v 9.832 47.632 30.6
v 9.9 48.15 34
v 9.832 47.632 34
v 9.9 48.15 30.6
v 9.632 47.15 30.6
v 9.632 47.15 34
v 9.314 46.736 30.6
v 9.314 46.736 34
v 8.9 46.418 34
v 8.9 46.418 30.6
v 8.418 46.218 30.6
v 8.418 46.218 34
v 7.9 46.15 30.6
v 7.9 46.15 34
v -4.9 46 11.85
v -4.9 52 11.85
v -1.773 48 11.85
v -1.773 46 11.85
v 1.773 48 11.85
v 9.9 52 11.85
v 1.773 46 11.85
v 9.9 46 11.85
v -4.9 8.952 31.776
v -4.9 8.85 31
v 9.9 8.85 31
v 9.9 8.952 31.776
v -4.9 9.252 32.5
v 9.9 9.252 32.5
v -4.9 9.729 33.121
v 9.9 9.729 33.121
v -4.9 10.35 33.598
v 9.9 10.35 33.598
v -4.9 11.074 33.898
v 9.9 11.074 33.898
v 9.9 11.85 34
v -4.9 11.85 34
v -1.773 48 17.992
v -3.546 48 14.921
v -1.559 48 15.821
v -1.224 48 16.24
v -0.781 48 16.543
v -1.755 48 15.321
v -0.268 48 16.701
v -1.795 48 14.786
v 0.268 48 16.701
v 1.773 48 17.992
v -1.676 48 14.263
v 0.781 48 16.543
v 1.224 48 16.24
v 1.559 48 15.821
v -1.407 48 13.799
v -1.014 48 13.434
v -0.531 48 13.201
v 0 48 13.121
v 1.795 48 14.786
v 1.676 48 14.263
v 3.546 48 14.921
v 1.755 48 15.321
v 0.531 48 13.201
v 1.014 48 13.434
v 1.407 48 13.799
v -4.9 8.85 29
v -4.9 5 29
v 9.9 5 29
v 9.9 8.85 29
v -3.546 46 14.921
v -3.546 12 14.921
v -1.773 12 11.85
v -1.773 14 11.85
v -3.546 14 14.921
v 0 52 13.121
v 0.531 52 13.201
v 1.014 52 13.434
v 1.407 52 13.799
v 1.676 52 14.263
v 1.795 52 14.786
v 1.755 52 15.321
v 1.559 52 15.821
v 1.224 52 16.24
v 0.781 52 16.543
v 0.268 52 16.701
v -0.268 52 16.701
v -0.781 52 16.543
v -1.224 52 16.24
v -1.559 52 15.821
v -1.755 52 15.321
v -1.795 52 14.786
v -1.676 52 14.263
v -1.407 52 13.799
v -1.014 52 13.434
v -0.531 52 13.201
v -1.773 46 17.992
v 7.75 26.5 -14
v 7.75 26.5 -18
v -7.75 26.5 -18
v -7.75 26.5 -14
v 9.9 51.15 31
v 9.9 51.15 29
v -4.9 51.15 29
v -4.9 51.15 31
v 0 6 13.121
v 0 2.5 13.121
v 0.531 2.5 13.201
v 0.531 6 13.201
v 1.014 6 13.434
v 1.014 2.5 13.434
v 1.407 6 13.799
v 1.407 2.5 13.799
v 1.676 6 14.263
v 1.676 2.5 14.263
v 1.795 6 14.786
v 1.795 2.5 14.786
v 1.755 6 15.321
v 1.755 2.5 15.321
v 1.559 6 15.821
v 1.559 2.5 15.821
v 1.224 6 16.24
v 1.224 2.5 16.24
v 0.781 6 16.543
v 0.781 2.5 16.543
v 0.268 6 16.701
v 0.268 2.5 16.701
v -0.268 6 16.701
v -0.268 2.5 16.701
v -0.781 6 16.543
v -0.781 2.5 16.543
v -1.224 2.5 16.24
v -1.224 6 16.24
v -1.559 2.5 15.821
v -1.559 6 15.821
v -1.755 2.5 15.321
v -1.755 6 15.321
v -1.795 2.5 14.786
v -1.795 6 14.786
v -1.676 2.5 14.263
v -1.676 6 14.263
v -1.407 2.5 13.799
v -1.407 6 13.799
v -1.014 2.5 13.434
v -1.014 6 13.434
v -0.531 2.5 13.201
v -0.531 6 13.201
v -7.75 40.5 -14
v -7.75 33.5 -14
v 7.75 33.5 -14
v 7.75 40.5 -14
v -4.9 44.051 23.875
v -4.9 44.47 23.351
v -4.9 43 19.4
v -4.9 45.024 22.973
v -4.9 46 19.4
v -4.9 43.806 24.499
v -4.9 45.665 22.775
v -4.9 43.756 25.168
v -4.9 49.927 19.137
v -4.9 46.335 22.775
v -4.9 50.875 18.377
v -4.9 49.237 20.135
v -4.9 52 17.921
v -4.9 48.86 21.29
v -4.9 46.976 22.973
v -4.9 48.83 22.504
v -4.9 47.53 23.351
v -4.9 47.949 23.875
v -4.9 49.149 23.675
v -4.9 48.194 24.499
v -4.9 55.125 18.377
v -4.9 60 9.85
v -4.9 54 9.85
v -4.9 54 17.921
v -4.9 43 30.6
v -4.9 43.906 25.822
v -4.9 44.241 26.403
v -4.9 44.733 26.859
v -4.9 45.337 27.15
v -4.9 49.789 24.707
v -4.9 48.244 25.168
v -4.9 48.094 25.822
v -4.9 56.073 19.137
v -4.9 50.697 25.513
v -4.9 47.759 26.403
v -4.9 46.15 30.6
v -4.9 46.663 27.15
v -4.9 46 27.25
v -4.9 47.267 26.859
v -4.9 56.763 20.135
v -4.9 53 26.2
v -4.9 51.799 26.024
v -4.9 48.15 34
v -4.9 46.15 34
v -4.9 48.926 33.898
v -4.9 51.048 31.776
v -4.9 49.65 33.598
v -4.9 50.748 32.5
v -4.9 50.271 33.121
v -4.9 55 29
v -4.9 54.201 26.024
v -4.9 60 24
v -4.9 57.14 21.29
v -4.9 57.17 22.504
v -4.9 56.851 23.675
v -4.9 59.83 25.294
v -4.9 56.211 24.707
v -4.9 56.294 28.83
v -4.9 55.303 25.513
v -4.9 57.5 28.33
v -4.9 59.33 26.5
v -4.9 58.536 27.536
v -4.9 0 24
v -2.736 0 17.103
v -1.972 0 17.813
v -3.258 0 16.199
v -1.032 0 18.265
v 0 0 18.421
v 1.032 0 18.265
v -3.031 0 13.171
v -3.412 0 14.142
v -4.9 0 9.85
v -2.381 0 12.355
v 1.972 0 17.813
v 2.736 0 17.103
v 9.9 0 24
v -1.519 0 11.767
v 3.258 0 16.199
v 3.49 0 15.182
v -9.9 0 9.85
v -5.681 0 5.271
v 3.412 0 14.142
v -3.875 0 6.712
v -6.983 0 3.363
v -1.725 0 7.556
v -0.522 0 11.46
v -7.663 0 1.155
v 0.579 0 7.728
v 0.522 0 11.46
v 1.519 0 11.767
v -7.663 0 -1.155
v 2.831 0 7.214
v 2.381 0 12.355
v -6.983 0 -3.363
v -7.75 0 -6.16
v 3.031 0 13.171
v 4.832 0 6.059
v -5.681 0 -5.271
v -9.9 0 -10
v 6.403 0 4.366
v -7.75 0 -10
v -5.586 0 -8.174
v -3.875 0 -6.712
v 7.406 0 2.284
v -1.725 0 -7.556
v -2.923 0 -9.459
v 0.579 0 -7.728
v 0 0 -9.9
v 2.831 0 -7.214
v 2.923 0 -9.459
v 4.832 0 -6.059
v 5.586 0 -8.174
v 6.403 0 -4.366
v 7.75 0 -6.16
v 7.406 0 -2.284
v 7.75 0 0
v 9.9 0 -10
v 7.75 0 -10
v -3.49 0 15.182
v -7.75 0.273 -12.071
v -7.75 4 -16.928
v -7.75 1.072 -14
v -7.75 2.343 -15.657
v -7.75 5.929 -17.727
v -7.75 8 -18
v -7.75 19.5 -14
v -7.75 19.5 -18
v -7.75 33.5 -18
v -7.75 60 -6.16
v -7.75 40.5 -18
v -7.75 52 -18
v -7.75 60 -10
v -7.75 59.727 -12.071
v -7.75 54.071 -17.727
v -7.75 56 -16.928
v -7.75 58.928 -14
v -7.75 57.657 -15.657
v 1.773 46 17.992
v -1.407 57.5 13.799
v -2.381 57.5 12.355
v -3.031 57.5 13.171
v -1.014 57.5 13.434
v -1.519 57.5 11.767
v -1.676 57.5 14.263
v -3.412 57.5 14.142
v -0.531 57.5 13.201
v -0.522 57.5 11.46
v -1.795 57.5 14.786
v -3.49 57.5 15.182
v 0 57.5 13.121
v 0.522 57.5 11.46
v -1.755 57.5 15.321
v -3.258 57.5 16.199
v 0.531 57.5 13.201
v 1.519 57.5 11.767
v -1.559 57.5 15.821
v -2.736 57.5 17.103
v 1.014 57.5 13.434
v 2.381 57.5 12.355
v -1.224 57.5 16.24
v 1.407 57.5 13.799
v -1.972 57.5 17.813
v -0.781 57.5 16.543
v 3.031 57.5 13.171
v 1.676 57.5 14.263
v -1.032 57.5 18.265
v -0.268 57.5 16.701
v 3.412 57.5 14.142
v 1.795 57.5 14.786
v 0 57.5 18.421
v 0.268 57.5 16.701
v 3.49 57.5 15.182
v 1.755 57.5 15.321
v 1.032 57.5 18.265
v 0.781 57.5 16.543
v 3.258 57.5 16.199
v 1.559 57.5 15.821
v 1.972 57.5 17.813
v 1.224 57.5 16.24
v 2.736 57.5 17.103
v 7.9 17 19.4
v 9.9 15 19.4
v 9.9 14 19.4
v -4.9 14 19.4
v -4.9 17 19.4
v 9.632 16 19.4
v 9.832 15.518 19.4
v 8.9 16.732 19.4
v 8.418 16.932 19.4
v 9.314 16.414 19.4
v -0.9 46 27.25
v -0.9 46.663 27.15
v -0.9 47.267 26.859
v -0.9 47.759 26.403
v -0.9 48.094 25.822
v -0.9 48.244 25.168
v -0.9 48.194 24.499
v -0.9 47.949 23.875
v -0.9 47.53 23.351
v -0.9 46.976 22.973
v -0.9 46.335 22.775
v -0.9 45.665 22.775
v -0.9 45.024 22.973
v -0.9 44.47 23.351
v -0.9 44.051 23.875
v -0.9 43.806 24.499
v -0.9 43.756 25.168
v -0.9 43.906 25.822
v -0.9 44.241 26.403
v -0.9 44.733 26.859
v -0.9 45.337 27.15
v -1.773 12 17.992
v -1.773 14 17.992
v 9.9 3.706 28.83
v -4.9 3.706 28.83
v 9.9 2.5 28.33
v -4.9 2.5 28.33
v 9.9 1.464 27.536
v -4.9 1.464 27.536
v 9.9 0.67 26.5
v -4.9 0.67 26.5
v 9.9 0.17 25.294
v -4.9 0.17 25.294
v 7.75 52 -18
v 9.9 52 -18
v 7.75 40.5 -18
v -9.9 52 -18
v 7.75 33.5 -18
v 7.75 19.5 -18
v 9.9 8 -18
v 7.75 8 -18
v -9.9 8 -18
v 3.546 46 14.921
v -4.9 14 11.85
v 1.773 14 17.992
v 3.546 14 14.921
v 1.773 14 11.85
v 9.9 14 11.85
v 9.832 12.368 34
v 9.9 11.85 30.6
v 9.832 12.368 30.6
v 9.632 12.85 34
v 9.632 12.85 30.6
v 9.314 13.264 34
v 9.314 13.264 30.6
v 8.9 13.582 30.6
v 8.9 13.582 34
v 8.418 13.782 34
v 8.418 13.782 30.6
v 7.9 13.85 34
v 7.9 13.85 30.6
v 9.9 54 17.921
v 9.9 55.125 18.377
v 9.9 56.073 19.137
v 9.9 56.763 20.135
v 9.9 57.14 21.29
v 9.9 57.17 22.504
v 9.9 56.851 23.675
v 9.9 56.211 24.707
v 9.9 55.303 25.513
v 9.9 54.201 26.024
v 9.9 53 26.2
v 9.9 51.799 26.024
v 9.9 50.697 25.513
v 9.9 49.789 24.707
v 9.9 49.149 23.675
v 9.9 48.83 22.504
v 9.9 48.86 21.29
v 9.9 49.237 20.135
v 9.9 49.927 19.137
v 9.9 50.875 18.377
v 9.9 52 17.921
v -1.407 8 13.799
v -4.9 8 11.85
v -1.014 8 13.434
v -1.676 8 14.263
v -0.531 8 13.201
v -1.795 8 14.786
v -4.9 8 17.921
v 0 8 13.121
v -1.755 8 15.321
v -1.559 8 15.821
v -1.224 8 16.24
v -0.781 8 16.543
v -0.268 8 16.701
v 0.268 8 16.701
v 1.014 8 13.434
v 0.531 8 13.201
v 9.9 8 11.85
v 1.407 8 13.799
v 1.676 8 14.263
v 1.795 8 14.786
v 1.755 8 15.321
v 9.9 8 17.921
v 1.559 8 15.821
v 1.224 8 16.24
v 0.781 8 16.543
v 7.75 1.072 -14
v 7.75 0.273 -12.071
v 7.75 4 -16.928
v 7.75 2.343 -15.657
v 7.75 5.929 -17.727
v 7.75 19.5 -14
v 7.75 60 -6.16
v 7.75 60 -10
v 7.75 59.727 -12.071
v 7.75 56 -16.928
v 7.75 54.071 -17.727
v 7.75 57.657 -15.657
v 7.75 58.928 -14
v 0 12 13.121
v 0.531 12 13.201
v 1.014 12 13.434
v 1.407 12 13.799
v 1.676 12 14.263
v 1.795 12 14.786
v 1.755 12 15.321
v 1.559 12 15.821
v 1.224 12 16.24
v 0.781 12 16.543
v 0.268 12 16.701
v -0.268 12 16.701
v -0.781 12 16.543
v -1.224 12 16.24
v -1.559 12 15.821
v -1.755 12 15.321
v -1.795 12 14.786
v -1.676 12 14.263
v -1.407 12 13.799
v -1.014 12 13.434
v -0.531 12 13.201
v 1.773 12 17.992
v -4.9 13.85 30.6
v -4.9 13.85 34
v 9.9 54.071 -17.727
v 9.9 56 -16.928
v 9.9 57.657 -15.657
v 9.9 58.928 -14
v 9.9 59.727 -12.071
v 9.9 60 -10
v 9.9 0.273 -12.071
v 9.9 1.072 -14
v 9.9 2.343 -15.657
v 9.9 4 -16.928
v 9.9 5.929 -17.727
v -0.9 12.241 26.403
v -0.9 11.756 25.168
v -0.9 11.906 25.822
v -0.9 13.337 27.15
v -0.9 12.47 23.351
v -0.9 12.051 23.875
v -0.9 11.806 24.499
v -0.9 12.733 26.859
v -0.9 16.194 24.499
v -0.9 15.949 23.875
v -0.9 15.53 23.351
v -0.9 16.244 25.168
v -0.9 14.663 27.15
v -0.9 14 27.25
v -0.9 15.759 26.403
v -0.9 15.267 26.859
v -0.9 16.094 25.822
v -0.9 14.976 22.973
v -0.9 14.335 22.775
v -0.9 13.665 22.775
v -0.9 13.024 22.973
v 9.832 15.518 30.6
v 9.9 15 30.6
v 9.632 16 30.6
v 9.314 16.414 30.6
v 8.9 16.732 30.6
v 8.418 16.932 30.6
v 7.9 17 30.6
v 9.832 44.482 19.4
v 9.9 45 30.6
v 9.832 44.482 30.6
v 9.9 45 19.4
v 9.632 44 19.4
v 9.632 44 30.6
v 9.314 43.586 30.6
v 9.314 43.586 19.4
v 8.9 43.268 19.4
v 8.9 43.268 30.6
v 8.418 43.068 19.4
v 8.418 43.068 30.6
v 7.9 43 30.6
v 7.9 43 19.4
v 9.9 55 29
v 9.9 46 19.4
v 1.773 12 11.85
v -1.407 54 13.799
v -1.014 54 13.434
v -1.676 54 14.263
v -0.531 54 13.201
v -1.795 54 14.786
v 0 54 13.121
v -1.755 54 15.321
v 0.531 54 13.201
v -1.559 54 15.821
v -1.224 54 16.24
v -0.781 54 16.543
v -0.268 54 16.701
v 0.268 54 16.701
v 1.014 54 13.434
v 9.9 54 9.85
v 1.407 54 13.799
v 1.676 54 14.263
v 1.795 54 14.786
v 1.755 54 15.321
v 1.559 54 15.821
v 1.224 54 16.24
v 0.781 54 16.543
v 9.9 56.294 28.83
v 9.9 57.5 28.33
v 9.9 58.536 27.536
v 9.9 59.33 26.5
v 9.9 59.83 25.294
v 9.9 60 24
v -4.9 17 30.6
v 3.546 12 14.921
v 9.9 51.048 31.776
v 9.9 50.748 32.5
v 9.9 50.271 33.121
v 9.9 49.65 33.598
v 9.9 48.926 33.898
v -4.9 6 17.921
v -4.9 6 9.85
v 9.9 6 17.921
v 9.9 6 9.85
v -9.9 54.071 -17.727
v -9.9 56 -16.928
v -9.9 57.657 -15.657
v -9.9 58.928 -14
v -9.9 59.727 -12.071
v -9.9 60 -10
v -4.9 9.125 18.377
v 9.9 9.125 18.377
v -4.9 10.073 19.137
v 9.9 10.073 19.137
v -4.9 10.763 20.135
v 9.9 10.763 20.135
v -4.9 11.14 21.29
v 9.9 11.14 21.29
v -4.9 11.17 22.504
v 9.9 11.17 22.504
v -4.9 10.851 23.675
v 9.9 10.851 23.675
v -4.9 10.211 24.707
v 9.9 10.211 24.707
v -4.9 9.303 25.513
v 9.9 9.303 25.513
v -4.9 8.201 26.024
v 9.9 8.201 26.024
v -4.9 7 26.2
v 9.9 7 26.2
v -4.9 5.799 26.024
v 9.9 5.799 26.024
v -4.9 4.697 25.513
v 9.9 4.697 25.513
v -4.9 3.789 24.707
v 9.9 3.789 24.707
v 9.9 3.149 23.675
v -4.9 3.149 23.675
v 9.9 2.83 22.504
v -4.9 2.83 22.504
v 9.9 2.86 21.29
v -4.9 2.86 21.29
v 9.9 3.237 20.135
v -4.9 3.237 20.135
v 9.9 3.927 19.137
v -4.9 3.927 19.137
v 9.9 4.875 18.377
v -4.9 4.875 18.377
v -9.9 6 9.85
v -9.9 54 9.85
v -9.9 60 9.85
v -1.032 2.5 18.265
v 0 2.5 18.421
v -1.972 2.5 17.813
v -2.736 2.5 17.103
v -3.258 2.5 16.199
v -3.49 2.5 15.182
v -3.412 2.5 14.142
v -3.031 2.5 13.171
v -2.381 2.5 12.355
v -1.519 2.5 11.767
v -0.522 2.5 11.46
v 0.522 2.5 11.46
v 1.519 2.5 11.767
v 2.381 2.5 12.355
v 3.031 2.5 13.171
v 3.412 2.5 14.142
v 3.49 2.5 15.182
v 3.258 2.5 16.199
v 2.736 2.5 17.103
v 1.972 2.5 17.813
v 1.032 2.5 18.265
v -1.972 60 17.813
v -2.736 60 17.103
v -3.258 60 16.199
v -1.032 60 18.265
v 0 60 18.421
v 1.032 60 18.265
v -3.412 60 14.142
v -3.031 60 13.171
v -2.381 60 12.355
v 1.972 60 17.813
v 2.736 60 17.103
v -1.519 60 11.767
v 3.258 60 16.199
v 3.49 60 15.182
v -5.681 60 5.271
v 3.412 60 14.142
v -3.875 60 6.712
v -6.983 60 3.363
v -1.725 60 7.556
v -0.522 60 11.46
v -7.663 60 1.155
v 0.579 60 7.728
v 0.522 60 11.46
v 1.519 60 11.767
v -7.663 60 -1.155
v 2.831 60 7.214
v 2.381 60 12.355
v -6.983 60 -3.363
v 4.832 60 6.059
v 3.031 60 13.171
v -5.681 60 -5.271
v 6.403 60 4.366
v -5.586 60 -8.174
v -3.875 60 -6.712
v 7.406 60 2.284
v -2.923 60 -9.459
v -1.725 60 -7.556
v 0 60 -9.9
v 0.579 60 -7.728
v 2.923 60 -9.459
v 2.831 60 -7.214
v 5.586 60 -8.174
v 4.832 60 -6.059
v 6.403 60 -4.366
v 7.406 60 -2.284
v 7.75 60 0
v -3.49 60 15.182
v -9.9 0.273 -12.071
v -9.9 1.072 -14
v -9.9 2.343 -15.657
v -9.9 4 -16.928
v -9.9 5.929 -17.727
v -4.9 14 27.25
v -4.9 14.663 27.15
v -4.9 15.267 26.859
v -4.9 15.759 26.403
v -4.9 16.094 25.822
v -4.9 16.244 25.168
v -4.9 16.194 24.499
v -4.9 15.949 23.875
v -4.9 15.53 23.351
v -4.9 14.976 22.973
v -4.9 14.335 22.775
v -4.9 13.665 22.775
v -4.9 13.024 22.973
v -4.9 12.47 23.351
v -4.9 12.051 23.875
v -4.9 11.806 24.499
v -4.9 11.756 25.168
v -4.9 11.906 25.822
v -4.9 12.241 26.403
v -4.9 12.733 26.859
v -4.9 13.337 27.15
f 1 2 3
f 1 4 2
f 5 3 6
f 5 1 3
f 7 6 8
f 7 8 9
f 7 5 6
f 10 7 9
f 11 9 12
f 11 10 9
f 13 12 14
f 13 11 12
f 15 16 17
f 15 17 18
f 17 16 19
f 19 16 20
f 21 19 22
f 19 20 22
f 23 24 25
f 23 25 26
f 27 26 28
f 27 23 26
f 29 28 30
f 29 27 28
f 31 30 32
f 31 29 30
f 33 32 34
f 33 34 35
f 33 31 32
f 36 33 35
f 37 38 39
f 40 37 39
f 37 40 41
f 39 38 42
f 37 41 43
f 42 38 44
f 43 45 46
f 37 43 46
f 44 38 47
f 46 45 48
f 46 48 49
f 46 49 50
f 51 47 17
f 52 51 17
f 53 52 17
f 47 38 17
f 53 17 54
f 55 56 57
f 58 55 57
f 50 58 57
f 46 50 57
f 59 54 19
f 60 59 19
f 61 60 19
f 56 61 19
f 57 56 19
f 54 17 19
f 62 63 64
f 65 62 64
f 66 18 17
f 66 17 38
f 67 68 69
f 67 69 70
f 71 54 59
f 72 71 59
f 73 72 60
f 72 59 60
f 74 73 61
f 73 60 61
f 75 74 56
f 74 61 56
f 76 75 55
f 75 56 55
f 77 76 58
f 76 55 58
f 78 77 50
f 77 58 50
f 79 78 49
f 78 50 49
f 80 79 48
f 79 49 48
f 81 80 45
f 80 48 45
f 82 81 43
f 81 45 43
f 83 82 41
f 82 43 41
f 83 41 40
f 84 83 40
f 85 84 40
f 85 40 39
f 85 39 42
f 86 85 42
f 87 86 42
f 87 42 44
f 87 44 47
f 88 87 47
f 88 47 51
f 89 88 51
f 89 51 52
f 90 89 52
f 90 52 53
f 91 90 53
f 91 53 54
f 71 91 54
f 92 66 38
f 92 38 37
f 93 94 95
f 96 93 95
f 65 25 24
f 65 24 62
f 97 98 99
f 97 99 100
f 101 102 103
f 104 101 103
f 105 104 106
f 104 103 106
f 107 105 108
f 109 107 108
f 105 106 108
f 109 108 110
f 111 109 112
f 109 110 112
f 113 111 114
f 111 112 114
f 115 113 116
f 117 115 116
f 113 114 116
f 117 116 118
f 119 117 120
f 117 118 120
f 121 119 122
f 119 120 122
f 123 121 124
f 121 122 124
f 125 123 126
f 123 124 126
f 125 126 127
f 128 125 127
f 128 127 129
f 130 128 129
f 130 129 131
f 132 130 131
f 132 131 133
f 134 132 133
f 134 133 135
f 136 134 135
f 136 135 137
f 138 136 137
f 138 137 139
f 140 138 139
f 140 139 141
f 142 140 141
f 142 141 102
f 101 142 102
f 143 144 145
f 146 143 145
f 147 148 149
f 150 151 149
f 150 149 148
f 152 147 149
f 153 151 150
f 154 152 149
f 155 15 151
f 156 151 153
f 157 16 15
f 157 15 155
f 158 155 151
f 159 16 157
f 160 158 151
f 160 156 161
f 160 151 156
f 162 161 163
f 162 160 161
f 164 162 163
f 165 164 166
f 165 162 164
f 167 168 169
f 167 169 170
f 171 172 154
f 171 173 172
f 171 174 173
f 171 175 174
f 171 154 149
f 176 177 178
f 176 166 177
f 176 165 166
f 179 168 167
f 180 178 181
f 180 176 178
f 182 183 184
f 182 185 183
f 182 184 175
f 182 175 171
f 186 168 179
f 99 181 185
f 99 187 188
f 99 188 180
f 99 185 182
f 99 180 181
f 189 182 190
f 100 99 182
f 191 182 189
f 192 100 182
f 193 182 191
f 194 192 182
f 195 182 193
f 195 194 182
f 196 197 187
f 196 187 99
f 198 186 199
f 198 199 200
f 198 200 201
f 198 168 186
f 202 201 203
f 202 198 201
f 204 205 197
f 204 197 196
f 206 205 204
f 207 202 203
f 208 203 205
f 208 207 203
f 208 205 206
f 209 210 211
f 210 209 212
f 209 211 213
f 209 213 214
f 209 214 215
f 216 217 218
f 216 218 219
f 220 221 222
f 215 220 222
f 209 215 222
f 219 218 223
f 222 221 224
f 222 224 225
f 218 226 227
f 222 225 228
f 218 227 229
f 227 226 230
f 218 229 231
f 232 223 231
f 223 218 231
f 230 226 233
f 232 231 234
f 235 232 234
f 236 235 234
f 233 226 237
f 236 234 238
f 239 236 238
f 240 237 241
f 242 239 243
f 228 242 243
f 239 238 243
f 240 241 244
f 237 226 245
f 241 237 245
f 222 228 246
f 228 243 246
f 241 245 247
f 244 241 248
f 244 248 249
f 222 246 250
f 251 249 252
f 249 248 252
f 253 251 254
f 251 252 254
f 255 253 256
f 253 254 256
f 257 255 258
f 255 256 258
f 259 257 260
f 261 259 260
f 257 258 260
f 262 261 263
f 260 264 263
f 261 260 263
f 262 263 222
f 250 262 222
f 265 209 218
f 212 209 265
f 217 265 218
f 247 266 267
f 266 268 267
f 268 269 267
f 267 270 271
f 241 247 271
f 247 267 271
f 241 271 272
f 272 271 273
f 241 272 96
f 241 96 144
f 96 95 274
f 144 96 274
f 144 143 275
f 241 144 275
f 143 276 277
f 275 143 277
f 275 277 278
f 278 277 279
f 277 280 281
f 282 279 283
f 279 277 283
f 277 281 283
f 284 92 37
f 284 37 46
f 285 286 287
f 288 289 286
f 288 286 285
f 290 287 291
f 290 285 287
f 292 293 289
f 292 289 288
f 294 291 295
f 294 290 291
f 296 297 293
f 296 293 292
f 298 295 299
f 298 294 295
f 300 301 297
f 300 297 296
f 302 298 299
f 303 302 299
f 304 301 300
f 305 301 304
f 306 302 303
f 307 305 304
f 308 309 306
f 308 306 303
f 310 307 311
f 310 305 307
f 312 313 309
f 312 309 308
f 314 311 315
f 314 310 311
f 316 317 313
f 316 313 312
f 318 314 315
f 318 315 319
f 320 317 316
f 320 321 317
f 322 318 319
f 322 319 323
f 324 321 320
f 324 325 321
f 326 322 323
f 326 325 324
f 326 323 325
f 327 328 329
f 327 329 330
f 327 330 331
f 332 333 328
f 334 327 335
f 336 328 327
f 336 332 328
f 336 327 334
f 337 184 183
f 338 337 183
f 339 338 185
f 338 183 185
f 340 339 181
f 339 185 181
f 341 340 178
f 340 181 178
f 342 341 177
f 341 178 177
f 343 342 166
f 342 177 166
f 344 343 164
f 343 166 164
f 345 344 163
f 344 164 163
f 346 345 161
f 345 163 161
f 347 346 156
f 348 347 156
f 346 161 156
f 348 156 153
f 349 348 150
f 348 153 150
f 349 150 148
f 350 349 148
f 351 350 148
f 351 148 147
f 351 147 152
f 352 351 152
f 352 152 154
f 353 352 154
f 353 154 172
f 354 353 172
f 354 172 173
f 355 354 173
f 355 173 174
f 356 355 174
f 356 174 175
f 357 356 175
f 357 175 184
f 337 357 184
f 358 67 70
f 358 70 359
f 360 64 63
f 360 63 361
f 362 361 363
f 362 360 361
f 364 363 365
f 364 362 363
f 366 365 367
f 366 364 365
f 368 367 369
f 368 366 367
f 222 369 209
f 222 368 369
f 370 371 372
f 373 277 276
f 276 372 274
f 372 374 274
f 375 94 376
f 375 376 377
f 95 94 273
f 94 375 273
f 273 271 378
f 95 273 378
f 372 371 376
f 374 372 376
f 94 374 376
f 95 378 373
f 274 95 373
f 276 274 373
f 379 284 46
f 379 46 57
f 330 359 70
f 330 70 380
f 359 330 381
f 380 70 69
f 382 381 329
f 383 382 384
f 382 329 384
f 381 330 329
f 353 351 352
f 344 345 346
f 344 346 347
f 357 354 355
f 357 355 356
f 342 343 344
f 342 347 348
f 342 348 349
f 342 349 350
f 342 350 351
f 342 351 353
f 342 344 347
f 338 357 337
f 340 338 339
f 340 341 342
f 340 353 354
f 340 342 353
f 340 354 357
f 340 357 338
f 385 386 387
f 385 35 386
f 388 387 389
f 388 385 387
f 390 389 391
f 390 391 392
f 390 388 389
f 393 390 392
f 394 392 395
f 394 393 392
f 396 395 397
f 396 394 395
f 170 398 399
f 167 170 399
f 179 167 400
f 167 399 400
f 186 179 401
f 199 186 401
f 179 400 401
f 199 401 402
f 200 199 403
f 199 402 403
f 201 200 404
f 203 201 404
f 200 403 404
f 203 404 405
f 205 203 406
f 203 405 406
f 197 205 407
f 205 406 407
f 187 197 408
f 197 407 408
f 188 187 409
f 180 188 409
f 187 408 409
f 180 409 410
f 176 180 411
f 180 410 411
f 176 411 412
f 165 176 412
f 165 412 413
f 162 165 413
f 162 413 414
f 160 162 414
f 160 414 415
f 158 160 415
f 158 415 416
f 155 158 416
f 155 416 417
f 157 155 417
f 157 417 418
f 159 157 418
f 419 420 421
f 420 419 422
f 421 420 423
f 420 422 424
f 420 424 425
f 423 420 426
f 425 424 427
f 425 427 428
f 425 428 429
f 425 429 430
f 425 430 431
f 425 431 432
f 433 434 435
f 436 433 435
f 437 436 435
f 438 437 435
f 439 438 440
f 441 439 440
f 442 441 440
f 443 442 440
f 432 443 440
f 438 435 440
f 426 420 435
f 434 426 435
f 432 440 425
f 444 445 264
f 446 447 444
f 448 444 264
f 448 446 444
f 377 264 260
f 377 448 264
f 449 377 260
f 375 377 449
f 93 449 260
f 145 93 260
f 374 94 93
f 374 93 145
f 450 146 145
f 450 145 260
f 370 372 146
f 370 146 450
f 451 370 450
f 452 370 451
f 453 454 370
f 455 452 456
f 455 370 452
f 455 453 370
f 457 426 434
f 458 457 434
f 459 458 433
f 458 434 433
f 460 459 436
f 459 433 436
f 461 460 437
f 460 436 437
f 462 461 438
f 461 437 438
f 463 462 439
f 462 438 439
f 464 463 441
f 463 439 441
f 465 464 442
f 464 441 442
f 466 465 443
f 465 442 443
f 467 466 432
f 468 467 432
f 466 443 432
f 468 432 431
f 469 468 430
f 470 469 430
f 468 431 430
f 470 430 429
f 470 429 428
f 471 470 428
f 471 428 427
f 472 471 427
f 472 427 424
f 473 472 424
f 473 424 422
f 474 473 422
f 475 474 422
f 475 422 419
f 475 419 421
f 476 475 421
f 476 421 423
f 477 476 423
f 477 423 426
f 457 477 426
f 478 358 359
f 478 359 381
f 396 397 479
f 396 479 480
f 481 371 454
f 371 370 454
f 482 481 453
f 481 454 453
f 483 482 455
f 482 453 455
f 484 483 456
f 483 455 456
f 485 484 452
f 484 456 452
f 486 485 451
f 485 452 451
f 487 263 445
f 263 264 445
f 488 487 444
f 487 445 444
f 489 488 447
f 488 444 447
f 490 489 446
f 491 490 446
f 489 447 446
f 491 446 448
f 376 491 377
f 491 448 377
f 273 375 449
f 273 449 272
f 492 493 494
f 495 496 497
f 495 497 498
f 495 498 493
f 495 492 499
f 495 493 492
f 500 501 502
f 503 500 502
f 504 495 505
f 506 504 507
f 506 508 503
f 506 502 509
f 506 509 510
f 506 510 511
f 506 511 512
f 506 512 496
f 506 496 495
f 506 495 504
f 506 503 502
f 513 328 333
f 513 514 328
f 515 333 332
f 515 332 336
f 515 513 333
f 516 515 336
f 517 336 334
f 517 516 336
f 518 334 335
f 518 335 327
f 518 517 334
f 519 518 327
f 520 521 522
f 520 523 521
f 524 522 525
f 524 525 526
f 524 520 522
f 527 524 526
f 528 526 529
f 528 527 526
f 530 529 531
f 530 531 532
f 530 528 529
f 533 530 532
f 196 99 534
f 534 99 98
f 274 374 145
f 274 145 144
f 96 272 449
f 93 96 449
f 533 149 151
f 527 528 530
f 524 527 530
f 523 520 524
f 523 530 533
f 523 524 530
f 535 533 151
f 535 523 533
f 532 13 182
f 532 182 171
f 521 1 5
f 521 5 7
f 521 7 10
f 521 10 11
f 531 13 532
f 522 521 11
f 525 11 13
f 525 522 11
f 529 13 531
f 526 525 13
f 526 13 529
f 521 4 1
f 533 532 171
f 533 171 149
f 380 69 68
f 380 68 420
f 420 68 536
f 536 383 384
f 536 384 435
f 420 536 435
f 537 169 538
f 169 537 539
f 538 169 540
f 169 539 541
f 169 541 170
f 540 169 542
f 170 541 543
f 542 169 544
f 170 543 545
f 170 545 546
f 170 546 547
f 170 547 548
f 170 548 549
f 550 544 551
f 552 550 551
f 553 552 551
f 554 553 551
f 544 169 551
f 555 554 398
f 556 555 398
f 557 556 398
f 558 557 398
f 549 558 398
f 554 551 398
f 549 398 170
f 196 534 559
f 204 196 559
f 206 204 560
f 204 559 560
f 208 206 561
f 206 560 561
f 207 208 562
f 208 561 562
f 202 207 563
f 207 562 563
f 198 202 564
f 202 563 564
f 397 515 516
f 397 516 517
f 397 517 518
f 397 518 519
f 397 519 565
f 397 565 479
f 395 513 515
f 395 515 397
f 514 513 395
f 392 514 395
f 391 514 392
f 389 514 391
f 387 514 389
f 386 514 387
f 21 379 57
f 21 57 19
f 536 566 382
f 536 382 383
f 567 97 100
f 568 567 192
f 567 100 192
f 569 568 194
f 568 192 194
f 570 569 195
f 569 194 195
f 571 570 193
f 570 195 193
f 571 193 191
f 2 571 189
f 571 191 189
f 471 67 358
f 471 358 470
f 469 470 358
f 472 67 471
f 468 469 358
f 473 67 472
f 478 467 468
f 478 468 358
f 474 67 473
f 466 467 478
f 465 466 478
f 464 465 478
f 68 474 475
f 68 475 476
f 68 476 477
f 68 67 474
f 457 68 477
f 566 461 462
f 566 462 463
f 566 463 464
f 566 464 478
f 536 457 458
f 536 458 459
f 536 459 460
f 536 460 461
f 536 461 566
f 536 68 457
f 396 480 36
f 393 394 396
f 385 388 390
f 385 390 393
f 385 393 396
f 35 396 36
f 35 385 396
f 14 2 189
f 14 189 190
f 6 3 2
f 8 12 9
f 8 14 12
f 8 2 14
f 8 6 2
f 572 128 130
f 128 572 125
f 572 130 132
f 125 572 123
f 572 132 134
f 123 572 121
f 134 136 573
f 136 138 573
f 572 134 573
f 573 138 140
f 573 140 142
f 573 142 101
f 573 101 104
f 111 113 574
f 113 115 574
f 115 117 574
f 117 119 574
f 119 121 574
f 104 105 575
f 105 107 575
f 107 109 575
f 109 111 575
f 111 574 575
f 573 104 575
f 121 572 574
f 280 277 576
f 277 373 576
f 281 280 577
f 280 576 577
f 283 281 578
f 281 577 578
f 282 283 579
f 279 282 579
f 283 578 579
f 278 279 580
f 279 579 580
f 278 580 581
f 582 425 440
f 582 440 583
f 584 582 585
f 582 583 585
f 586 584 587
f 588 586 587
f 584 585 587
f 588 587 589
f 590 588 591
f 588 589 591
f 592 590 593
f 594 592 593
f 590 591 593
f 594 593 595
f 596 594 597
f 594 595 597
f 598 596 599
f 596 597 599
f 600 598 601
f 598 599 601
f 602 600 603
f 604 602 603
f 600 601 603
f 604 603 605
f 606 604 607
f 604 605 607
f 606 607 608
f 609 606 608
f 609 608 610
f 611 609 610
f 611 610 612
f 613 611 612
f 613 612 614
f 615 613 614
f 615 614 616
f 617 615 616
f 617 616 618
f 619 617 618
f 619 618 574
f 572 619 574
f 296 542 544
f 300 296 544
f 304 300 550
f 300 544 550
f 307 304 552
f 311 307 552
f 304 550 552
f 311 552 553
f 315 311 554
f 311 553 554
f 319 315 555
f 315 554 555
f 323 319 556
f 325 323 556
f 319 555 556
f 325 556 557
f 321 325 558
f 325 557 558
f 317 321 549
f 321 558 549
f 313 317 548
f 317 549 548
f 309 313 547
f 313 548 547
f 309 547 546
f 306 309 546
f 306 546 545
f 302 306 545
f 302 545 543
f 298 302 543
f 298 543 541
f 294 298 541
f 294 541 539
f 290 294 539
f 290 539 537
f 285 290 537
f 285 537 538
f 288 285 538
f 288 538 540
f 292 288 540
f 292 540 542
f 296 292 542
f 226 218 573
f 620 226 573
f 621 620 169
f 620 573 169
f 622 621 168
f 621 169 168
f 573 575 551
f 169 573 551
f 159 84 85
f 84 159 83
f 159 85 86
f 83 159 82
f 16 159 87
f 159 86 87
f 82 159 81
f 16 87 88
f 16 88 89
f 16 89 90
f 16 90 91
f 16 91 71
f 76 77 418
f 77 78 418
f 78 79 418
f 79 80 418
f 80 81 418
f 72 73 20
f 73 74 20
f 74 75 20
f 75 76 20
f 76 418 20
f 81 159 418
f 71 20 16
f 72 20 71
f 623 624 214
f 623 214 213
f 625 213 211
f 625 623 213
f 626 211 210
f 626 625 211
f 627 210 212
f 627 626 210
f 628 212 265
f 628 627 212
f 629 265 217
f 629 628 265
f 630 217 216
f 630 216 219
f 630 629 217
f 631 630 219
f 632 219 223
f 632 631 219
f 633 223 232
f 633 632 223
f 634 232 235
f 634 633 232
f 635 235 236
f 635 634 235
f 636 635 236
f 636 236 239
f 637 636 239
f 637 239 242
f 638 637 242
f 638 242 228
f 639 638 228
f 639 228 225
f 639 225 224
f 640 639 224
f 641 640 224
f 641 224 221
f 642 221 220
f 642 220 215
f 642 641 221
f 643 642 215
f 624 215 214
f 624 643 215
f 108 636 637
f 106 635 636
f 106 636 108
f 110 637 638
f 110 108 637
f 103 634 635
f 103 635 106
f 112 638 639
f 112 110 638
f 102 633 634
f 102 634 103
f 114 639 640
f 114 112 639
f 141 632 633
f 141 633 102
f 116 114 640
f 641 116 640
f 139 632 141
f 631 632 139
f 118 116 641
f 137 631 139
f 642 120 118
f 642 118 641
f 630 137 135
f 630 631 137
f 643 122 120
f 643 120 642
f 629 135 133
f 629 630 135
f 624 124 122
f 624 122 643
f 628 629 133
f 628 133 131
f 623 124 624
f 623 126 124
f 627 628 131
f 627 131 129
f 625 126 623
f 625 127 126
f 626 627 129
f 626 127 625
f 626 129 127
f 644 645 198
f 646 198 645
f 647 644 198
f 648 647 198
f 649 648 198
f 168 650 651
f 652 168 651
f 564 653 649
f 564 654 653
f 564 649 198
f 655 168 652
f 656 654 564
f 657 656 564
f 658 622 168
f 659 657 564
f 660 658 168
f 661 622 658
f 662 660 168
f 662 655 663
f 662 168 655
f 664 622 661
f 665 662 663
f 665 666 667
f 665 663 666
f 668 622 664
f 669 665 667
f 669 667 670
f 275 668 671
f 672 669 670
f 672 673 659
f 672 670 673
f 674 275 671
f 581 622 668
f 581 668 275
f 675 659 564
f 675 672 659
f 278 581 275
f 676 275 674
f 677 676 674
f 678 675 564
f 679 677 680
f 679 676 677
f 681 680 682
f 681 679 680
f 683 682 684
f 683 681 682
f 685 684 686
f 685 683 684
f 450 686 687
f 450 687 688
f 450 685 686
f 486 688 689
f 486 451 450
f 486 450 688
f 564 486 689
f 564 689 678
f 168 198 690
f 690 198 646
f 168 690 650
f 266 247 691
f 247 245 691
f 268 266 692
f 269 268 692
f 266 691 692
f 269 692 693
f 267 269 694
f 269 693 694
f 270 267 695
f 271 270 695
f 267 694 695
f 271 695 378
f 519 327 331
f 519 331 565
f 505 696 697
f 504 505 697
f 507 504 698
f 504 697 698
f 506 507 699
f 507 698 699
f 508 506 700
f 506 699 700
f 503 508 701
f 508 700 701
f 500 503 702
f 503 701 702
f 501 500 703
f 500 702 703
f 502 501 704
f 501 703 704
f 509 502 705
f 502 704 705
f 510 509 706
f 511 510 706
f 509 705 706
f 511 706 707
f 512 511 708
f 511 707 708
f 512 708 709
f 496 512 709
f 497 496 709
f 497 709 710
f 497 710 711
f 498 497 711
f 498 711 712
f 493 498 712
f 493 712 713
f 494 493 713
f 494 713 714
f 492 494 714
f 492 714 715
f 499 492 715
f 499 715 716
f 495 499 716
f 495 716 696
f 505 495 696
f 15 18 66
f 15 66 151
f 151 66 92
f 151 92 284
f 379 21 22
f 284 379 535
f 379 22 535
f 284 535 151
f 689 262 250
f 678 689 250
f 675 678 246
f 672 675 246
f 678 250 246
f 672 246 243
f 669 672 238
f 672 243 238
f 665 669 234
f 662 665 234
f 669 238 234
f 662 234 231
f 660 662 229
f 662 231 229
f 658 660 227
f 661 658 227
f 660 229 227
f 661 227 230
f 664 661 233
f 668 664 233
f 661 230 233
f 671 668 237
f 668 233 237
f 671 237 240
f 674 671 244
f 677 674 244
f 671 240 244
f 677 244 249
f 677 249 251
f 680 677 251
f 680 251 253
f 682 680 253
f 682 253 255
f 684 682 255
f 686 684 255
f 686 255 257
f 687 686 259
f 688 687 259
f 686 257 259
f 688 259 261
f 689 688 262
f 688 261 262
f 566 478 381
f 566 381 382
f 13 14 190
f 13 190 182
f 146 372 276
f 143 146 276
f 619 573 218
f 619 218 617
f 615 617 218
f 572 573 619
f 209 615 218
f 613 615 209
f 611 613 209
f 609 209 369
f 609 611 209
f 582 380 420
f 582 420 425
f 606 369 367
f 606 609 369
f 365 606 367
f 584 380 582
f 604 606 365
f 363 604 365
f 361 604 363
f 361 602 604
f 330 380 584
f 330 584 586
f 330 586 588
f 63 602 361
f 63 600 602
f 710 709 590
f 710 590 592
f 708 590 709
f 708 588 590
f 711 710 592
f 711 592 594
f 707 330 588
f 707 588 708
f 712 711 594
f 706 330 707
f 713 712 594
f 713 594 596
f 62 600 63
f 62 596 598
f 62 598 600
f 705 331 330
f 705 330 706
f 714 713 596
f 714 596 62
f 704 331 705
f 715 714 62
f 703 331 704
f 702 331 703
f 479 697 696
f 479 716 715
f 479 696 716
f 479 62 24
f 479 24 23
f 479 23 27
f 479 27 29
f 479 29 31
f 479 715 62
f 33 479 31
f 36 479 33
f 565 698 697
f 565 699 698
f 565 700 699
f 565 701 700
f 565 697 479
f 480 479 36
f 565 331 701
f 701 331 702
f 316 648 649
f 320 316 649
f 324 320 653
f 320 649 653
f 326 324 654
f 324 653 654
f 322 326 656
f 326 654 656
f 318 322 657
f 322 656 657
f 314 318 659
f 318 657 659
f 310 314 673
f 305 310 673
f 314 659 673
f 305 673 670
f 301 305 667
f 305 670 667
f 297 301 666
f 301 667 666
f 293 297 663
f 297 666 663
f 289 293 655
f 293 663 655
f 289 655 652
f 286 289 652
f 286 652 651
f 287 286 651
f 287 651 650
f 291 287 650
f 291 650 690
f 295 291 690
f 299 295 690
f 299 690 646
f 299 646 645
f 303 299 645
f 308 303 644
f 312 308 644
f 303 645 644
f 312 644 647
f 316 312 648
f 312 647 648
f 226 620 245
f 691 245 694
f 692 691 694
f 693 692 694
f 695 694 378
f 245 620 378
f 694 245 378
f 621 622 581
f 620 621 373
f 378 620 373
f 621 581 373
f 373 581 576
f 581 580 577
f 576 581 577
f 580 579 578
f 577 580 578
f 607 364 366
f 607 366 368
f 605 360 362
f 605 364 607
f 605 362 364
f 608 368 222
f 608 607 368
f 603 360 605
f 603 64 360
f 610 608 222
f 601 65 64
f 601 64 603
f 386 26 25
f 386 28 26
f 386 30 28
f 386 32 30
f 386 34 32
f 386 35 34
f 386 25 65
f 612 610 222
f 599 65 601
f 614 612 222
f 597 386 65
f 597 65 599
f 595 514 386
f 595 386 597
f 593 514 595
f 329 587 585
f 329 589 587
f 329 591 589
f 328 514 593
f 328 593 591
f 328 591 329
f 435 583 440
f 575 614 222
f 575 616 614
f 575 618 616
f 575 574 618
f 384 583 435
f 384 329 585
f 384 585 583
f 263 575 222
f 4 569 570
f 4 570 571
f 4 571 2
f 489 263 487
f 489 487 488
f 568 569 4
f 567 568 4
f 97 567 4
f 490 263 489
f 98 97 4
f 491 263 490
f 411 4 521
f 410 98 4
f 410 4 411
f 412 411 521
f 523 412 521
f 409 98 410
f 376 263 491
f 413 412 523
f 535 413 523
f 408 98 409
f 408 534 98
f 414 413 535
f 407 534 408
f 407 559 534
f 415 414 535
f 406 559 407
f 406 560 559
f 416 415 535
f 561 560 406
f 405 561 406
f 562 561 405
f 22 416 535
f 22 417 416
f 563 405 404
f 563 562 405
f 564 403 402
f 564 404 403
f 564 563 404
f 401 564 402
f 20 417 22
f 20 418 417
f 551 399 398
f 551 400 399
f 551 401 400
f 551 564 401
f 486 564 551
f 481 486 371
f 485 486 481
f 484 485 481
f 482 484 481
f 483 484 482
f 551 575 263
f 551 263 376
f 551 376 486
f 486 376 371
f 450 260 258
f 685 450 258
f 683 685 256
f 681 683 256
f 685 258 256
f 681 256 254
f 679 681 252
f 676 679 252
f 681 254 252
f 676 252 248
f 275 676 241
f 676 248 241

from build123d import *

# Parameters (mm, degrees)
SKETCH_1_W                = 15.5
SKETCH_1_H                = 11.302783866
EXTRUDE_1_DEPTH           = 60
SKETCH_2_R                = 4.2
CUT_EXTRUDE_1_DEPTH       = 90
CUT_EXTRUDE_2_DEPTH       = 40
SKETCH_4_W                = 15.5
SKETCH_4_H                = 19.5
SKETCH_4_H_2              = 7
CUT_EXTRUDE_3_DEPTH       = 6
FILLET_1_R                = 5
FILLET_2_R                = 8
SKETCH_13_R               = 1.8
CUT_EXTRUDE_9_DEPTH       = 75
CUT_EXTRUDE_10_DEPTH      = 34
CUT_EXTRUDE_10_DEPTH_BACK = 2
SKETCH_15_R               = 3.5
CUT_EXTRUDE_11_DEPTH      = 2.5
CUT_EXTRUDE_START         = -2.5
SKETCH_16_R               = 3.5
CUT_EXTRUDE_12_DEPTH      = 2.5
EXTRUDE_2_DEPTH           = 19.8
FILLET_3_R                = 3
SKETCH_18_R               = 2.25
CUT_EXTRUDE_13_DEPTH      = 9
FILLET_4_R                = 2
SKETCH_19_W               = 40.971402115
SKETCH_19_H               = 78.896815639
CUT_EXTRUDE_14_DEPTH      = 5


with BuildPart() as part:
    # Эскиз1 → Бобышка-Вытянуть1 (new body)
    with BuildSketch(Plane(origin=(0, 0, 0), x_dir=(1, 0, 0), z_dir=(0, 1, 0))):
        with BuildLine():
            Line((7.75, 0), (7.75, 6.160154219))
            ThreePointArc((7.75, 6.160154219), (0, 9.9), (-7.75, 6.160154219))
            Line((-7.75, 6.160154219), (-7.75, 1e-08))
            ThreePointArc((-7.75, 1e-08), (5e-09, 7.75), (7.75, 0))
        make_face()
        with BuildLine():
            ThreePointArc((0, -9.9), (4.302584876, -8.916151826), (7.75, -6.160154219))
            Line((7.75, -6.160154219), (7.75, 0))
            ThreePointArc((7.75, 0), (-5e-09, -7.75), (-7.75, 1e-08))
            Line((-7.75, 1e-08), (-7.75, -6.160154219))
            ThreePointArc((-7.75, -6.160154219), (-4.302584876, -8.916151826), (0, -9.9))
        make_face()
        with BuildLine():
            ThreePointArc((7.75, 6.160154219), (9.347058361, 3.262284476), (9.9, 0))
            Line((9.9, 0), (9.9, 18))
            Line((9.9, 18), (-9.9, 18))
            Line((-9.9, 18), (-9.9, 0))
            ThreePointArc((-9.9, 0), (-9.347058361, 3.262284476), (-7.75, 6.160154219))
            Line((-7.75, 6.160154219), (-7.75, 14))
            Line((-7.75, 14), (7.75, 14))
            Line((7.75, 14), (7.75, 6.160154219))
        make_face()
        with BuildLine():
            ThreePointArc((7.75, -6.160154219), (9.347058361, -3.262284476), (9.9, 0))
            ThreePointArc((9.9, 0), (9.347058361, 3.262284476), (7.75, 6.160154219))
            Line((7.75, 6.160154219), (7.75, 0))
            Line((7.75, 0), (7.75, -6.160154219))
        make_face()
        with BuildLine():
            Line((-7.75, 1e-08), (-7.75, 6.160154219))
            ThreePointArc((-7.75, 6.160154219), (-9.347058361, 3.262284476), (-9.9, 0))
            ThreePointArc((-9.9, 0), (-9.347058361, -3.262284476), (-7.75, -6.160154219))
            Line((-7.75, -6.160154219), (-7.75, 1e-08))
        make_face()
        with BuildLine():
            Line((9.9, -29), (9.9, 0))
            ThreePointArc((9.9, 0), (9.347058361, -3.262284476), (7.75, -6.160154219))
            Line((7.75, -6.160154219), (7.75, -9.9))
            Line((7.75, -9.9), (7.75, -11.85))
            Line((7.75, -11.85), (7.75, -23.152783866))
            Line((7.75, -23.152783866), (-7.75, -23.152783866))
            Line((-7.75, -23.152783866), (-7.75, -11.85))
            Line((-7.75, -11.85), (-7.75, -9.9))
            Line((-7.75, -9.9), (-7.75, -6.160154219))
            ThreePointArc((-7.75, -6.160154219), (-9.347058361, -3.262284476), (-9.9, 0))
            Line((-9.9, 0), (-9.9, -29))
            Line((-9.9, -29), (9.9, -29))
        make_face()
        with Locations((0, -17.501391933)):
            Rectangle(SKETCH_1_W, SKETCH_1_H)
        Polygon((7.75, -11.85), (7.75, -9.9), (0, -9.9), (-7.75, -9.9), (-7.75, -11.85), align=None)
        with BuildLine():
            Line((7.75, -9.9), (7.75, -6.160154219))
            ThreePointArc((7.75, -6.160154219), (4.302584876, -8.916151826), (0, -9.9))
            Line((0, -9.9), (7.75, -9.9))
        make_face()
        with BuildLine():
            Line((-7.75, -9.9), (0, -9.9))
            ThreePointArc((0, -9.9), (-4.302584876, -8.916151826), (-7.75, -6.160154219))
            Line((-7.75, -6.160154219), (-7.75, -9.9))
        make_face()
    extrude(amount=EXTRUDE_1_DEPTH)

    # Эскиз2 → Вырез-Вытянуть1 (cut)
    with BuildSketch(Plane(origin=(9.9, 0, 0), x_dir=(0, 0, -1), z_dir=(1, 0, 0))):
        with Locations((-22, 53)):
            Circle(SKETCH_2_R)
        with Locations((-22, 7)):
            Circle(SKETCH_2_R)
    extrude(amount=-CUT_EXTRUDE_1_DEPTH, mode=Mode.SUBTRACT)

    # Эскиз3 → Вырез-Вытянуть2 (cut)
    with BuildSketch(Plane(origin=(9.9, 0, 0), x_dir=(0, 0, -1), z_dir=(1, 0, 0))):
        Polygon((-29, 46), (-29, 14), (-11.85, 14), (-11.85, 8), (-22, 8), (-22, 6), (-9.85, 6), (-9.85, 54), (-22, 54), (-22, 52), (-11.85, 52), (-11.85, 46), align=None)
    extrude(amount=-CUT_EXTRUDE_2_DEPTH, mode=Mode.SUBTRACT)

    # Эскиз4 → Вырез-Вытянуть3 (cut)
    with BuildSketch(Plane(origin=(0, 0, -18), x_dir=(-1, 0, 0), z_dir=(0, 0, -1))):
        with Locations((0, 50.25)):
            Rectangle(SKETCH_4_W, SKETCH_4_H)
        with Locations((0, 30)):
            Rectangle(SKETCH_4_W, SKETCH_4_H_2)
        with Locations((0, 9.75)):
            Rectangle(SKETCH_4_W, SKETCH_4_H)
    extrude(amount=-CUT_EXTRUDE_3_DEPTH, mode=Mode.SUBTRACT)

    # Скругление1
    fillet_1_edges = [part.edges().sort_by_distance(p)[0] for p in [
        (0, 60, 29),
        (0, 0, 29),
    ]]
    fillet(fillet_1_edges, radius=FILLET_1_R)

    # Скругление2
    fillet_2_edges = [part.edges().sort_by_distance(p)[0] for p in [
        (-8.825, 60, -18),
        (-8.825, 0, -18),
        (8.825, 0, -18),
        (8.825, 60, -18),
    ]]
    fillet(fillet_2_edges, radius=FILLET_2_R)

    # Эскиз13 → Вырез-Вытянуть9 (cut)
    with BuildSketch(Plane.XZ):
        with Locations(Location((0, 14.920784389, 0), (0, 0, 270))):
            Circle(SKETCH_13_R)
    extrude(amount=-CUT_EXTRUDE_9_DEPTH, mode=Mode.SUBTRACT)

    # Эскиз14 → Вырез-Вытянуть10 (cut, two sides: drawn at the far end of the back side and taken through both)
    with BuildSketch(Plane(origin=(0, 14, 0), x_dir=(1, 0, 0), z_dir=(0, 1, 0)).offset(-CUT_EXTRUDE_10_DEPTH_BACK)):
        Polygon((-1.772918194, -17.991568778), (1.772918194, -17.991568778), (3.545836387, -14.920784389), (1.772918194, -11.85), (-1.772918194, -11.85), (-3.545836387, -14.920784389), align=None)
    extrude(amount=CUT_EXTRUDE_10_DEPTH + CUT_EXTRUDE_10_DEPTH_BACK, mode=Mode.SUBTRACT)

    # Эскиз15 → Вырез-Вытянуть11 (cut)
    with BuildSketch(Plane(origin=(0, 60, 0), x_dir=(1, 0, 0), z_dir=(0, 1, 0))):
        with Locations(Location((0, -14.920784389, 0), (0, 0, 270))):
            Circle(SKETCH_15_R)
    extrude(amount=-CUT_EXTRUDE_11_DEPTH, mode=Mode.SUBTRACT)

    # Эскиз16 → Вырез-Вытянуть12 (cut)
    with BuildSketch(Plane.XZ.offset(CUT_EXTRUDE_START)):
        with Locations(Location((0, 14.920784389, 0), (0, 0, 90))):
            Circle(SKETCH_16_R)
    extrude(amount=CUT_EXTRUDE_12_DEPTH, mode=Mode.SUBTRACT)

    # Эскиз17 → Бобышка-Вытянуть2 (add)
    with BuildSketch(Plane(origin=(9.9, 0, 0), x_dir=(0, 0, -1), z_dir=(1, 0, 0))):
        Polygon((-30.6, 43), (-19.4, 43), (-19.4, 46), (-29, 46), (-29, 51.15), (-34, 51.15), (-34, 46.15), (-30.6, 46.15), align=None)
        Polygon((-29, 14), (-19.4, 14), (-19.4, 17), (-28.462723747, 17), (-30.6, 17), (-30.6, 13.85), (-34, 13.85), (-34, 8.85), (-29.808389015, 8.85), (-29, 8.85), align=None)
    extrude(amount=-EXTRUDE_2_DEPTH)

    # Скругление3
    fillet_3_edges = [part.edges().sort_by_distance(p)[0] for p in [
        (0, 51.15, 34),
        (0, 8.85, 34),
    ]]
    fillet(fillet_3_edges, radius=FILLET_3_R)

    # Эскиз18 → Вырез-Вытянуть13 (cut)
    with BuildSketch(Plane.ZY.offset(9.9)):
        with Locations((25, 14)):
            Circle(SKETCH_18_R)
        with Locations((25, 46)):
            Circle(SKETCH_18_R)
    extrude(amount=-CUT_EXTRUDE_13_DEPTH, mode=Mode.SUBTRACT)

    # Скругление4
    fillet_4_edges = [part.edges().sort_by_distance(p)[0] for p in [
        (9.9, 13.85, 32.3),
        (9.9, 17, 25),
        (9.9, 43, 25),
        (9.9, 46.15, 32.3),
    ]]
    fillet(fillet_4_edges, radius=FILLET_4_R)

    # Эскиз19 → Вырез-Вытянуть14 (cut)
    with BuildSketch(Plane.ZY.offset(9.9)):
        with Locations((30.335701058, 24.667257597)):
            Rectangle(SKETCH_19_W, SKETCH_19_H)
    extrude(amount=-CUT_EXTRUDE_14_DEPTH, mode=Mode.SUBTRACT)


solid = part.part
